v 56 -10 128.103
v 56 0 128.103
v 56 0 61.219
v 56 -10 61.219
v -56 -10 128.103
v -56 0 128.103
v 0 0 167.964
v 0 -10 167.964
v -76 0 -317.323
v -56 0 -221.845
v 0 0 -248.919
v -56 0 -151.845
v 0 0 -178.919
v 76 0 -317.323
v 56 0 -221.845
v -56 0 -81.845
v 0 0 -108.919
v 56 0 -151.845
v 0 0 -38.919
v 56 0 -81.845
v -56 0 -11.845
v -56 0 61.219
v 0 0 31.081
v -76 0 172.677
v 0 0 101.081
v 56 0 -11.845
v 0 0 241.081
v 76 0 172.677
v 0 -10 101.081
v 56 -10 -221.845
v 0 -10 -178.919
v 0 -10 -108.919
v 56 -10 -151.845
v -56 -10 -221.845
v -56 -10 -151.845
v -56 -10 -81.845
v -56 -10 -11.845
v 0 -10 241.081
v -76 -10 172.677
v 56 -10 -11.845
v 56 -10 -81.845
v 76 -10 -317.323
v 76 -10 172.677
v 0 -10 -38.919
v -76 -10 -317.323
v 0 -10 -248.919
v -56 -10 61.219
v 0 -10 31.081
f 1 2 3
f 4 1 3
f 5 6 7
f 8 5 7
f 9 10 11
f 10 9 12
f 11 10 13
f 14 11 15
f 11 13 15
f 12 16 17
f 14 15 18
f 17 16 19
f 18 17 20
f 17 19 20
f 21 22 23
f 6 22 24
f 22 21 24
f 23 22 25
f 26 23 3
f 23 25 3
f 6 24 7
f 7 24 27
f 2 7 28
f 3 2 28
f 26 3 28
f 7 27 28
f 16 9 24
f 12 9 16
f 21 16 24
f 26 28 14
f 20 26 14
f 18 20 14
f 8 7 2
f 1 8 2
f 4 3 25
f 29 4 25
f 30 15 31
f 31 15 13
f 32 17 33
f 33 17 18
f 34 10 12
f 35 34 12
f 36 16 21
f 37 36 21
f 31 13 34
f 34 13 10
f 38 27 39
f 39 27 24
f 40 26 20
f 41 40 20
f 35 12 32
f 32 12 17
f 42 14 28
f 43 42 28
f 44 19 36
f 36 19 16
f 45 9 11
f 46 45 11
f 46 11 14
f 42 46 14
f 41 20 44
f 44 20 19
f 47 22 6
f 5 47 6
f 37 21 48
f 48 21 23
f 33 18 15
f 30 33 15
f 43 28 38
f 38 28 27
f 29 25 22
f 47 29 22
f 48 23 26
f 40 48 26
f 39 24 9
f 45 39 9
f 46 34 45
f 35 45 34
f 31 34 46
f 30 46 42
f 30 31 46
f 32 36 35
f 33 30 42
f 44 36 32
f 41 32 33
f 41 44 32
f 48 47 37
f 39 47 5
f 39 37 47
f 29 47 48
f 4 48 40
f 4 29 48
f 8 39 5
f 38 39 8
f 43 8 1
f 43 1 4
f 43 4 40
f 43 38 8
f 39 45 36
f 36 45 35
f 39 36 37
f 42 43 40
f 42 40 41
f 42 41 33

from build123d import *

# Parameters (mm, degrees)
F1_DEPTH = 10


with BuildPart() as f1:
    # F0 (on Front) → F1 (new body)
    with BuildSketch(Plane.XZ):
        Polygon((76, 172.676718), (0, 241.080747), (-76, 172.676718), (-76, -317.323282), (0, -248.919253), (76, -317.323282), align=None)
        Polygon((-56, -151.845365), (0, -108.919253), (56, -151.845365), (56, -221.845365), (0, -178.919253), (-56, -221.845365), align=None, mode=Mode.SUBTRACT)
        Polygon((-56, -11.845365), (0, 31.080747), (56, -11.845365), (56, -81.845365), (0, -38.919253), (-56, -81.845365), align=None, mode=Mode.SUBTRACT)
        Polygon((-56, 128.102943), (0, 167.964432), (56, 128.102943), (56, 61.219258), (0, 101.080747), (-56, 61.219258), align=None, mode=Mode.SUBTRACT)
    extrude(amount=F1_DEPTH)


solid = f1.part
